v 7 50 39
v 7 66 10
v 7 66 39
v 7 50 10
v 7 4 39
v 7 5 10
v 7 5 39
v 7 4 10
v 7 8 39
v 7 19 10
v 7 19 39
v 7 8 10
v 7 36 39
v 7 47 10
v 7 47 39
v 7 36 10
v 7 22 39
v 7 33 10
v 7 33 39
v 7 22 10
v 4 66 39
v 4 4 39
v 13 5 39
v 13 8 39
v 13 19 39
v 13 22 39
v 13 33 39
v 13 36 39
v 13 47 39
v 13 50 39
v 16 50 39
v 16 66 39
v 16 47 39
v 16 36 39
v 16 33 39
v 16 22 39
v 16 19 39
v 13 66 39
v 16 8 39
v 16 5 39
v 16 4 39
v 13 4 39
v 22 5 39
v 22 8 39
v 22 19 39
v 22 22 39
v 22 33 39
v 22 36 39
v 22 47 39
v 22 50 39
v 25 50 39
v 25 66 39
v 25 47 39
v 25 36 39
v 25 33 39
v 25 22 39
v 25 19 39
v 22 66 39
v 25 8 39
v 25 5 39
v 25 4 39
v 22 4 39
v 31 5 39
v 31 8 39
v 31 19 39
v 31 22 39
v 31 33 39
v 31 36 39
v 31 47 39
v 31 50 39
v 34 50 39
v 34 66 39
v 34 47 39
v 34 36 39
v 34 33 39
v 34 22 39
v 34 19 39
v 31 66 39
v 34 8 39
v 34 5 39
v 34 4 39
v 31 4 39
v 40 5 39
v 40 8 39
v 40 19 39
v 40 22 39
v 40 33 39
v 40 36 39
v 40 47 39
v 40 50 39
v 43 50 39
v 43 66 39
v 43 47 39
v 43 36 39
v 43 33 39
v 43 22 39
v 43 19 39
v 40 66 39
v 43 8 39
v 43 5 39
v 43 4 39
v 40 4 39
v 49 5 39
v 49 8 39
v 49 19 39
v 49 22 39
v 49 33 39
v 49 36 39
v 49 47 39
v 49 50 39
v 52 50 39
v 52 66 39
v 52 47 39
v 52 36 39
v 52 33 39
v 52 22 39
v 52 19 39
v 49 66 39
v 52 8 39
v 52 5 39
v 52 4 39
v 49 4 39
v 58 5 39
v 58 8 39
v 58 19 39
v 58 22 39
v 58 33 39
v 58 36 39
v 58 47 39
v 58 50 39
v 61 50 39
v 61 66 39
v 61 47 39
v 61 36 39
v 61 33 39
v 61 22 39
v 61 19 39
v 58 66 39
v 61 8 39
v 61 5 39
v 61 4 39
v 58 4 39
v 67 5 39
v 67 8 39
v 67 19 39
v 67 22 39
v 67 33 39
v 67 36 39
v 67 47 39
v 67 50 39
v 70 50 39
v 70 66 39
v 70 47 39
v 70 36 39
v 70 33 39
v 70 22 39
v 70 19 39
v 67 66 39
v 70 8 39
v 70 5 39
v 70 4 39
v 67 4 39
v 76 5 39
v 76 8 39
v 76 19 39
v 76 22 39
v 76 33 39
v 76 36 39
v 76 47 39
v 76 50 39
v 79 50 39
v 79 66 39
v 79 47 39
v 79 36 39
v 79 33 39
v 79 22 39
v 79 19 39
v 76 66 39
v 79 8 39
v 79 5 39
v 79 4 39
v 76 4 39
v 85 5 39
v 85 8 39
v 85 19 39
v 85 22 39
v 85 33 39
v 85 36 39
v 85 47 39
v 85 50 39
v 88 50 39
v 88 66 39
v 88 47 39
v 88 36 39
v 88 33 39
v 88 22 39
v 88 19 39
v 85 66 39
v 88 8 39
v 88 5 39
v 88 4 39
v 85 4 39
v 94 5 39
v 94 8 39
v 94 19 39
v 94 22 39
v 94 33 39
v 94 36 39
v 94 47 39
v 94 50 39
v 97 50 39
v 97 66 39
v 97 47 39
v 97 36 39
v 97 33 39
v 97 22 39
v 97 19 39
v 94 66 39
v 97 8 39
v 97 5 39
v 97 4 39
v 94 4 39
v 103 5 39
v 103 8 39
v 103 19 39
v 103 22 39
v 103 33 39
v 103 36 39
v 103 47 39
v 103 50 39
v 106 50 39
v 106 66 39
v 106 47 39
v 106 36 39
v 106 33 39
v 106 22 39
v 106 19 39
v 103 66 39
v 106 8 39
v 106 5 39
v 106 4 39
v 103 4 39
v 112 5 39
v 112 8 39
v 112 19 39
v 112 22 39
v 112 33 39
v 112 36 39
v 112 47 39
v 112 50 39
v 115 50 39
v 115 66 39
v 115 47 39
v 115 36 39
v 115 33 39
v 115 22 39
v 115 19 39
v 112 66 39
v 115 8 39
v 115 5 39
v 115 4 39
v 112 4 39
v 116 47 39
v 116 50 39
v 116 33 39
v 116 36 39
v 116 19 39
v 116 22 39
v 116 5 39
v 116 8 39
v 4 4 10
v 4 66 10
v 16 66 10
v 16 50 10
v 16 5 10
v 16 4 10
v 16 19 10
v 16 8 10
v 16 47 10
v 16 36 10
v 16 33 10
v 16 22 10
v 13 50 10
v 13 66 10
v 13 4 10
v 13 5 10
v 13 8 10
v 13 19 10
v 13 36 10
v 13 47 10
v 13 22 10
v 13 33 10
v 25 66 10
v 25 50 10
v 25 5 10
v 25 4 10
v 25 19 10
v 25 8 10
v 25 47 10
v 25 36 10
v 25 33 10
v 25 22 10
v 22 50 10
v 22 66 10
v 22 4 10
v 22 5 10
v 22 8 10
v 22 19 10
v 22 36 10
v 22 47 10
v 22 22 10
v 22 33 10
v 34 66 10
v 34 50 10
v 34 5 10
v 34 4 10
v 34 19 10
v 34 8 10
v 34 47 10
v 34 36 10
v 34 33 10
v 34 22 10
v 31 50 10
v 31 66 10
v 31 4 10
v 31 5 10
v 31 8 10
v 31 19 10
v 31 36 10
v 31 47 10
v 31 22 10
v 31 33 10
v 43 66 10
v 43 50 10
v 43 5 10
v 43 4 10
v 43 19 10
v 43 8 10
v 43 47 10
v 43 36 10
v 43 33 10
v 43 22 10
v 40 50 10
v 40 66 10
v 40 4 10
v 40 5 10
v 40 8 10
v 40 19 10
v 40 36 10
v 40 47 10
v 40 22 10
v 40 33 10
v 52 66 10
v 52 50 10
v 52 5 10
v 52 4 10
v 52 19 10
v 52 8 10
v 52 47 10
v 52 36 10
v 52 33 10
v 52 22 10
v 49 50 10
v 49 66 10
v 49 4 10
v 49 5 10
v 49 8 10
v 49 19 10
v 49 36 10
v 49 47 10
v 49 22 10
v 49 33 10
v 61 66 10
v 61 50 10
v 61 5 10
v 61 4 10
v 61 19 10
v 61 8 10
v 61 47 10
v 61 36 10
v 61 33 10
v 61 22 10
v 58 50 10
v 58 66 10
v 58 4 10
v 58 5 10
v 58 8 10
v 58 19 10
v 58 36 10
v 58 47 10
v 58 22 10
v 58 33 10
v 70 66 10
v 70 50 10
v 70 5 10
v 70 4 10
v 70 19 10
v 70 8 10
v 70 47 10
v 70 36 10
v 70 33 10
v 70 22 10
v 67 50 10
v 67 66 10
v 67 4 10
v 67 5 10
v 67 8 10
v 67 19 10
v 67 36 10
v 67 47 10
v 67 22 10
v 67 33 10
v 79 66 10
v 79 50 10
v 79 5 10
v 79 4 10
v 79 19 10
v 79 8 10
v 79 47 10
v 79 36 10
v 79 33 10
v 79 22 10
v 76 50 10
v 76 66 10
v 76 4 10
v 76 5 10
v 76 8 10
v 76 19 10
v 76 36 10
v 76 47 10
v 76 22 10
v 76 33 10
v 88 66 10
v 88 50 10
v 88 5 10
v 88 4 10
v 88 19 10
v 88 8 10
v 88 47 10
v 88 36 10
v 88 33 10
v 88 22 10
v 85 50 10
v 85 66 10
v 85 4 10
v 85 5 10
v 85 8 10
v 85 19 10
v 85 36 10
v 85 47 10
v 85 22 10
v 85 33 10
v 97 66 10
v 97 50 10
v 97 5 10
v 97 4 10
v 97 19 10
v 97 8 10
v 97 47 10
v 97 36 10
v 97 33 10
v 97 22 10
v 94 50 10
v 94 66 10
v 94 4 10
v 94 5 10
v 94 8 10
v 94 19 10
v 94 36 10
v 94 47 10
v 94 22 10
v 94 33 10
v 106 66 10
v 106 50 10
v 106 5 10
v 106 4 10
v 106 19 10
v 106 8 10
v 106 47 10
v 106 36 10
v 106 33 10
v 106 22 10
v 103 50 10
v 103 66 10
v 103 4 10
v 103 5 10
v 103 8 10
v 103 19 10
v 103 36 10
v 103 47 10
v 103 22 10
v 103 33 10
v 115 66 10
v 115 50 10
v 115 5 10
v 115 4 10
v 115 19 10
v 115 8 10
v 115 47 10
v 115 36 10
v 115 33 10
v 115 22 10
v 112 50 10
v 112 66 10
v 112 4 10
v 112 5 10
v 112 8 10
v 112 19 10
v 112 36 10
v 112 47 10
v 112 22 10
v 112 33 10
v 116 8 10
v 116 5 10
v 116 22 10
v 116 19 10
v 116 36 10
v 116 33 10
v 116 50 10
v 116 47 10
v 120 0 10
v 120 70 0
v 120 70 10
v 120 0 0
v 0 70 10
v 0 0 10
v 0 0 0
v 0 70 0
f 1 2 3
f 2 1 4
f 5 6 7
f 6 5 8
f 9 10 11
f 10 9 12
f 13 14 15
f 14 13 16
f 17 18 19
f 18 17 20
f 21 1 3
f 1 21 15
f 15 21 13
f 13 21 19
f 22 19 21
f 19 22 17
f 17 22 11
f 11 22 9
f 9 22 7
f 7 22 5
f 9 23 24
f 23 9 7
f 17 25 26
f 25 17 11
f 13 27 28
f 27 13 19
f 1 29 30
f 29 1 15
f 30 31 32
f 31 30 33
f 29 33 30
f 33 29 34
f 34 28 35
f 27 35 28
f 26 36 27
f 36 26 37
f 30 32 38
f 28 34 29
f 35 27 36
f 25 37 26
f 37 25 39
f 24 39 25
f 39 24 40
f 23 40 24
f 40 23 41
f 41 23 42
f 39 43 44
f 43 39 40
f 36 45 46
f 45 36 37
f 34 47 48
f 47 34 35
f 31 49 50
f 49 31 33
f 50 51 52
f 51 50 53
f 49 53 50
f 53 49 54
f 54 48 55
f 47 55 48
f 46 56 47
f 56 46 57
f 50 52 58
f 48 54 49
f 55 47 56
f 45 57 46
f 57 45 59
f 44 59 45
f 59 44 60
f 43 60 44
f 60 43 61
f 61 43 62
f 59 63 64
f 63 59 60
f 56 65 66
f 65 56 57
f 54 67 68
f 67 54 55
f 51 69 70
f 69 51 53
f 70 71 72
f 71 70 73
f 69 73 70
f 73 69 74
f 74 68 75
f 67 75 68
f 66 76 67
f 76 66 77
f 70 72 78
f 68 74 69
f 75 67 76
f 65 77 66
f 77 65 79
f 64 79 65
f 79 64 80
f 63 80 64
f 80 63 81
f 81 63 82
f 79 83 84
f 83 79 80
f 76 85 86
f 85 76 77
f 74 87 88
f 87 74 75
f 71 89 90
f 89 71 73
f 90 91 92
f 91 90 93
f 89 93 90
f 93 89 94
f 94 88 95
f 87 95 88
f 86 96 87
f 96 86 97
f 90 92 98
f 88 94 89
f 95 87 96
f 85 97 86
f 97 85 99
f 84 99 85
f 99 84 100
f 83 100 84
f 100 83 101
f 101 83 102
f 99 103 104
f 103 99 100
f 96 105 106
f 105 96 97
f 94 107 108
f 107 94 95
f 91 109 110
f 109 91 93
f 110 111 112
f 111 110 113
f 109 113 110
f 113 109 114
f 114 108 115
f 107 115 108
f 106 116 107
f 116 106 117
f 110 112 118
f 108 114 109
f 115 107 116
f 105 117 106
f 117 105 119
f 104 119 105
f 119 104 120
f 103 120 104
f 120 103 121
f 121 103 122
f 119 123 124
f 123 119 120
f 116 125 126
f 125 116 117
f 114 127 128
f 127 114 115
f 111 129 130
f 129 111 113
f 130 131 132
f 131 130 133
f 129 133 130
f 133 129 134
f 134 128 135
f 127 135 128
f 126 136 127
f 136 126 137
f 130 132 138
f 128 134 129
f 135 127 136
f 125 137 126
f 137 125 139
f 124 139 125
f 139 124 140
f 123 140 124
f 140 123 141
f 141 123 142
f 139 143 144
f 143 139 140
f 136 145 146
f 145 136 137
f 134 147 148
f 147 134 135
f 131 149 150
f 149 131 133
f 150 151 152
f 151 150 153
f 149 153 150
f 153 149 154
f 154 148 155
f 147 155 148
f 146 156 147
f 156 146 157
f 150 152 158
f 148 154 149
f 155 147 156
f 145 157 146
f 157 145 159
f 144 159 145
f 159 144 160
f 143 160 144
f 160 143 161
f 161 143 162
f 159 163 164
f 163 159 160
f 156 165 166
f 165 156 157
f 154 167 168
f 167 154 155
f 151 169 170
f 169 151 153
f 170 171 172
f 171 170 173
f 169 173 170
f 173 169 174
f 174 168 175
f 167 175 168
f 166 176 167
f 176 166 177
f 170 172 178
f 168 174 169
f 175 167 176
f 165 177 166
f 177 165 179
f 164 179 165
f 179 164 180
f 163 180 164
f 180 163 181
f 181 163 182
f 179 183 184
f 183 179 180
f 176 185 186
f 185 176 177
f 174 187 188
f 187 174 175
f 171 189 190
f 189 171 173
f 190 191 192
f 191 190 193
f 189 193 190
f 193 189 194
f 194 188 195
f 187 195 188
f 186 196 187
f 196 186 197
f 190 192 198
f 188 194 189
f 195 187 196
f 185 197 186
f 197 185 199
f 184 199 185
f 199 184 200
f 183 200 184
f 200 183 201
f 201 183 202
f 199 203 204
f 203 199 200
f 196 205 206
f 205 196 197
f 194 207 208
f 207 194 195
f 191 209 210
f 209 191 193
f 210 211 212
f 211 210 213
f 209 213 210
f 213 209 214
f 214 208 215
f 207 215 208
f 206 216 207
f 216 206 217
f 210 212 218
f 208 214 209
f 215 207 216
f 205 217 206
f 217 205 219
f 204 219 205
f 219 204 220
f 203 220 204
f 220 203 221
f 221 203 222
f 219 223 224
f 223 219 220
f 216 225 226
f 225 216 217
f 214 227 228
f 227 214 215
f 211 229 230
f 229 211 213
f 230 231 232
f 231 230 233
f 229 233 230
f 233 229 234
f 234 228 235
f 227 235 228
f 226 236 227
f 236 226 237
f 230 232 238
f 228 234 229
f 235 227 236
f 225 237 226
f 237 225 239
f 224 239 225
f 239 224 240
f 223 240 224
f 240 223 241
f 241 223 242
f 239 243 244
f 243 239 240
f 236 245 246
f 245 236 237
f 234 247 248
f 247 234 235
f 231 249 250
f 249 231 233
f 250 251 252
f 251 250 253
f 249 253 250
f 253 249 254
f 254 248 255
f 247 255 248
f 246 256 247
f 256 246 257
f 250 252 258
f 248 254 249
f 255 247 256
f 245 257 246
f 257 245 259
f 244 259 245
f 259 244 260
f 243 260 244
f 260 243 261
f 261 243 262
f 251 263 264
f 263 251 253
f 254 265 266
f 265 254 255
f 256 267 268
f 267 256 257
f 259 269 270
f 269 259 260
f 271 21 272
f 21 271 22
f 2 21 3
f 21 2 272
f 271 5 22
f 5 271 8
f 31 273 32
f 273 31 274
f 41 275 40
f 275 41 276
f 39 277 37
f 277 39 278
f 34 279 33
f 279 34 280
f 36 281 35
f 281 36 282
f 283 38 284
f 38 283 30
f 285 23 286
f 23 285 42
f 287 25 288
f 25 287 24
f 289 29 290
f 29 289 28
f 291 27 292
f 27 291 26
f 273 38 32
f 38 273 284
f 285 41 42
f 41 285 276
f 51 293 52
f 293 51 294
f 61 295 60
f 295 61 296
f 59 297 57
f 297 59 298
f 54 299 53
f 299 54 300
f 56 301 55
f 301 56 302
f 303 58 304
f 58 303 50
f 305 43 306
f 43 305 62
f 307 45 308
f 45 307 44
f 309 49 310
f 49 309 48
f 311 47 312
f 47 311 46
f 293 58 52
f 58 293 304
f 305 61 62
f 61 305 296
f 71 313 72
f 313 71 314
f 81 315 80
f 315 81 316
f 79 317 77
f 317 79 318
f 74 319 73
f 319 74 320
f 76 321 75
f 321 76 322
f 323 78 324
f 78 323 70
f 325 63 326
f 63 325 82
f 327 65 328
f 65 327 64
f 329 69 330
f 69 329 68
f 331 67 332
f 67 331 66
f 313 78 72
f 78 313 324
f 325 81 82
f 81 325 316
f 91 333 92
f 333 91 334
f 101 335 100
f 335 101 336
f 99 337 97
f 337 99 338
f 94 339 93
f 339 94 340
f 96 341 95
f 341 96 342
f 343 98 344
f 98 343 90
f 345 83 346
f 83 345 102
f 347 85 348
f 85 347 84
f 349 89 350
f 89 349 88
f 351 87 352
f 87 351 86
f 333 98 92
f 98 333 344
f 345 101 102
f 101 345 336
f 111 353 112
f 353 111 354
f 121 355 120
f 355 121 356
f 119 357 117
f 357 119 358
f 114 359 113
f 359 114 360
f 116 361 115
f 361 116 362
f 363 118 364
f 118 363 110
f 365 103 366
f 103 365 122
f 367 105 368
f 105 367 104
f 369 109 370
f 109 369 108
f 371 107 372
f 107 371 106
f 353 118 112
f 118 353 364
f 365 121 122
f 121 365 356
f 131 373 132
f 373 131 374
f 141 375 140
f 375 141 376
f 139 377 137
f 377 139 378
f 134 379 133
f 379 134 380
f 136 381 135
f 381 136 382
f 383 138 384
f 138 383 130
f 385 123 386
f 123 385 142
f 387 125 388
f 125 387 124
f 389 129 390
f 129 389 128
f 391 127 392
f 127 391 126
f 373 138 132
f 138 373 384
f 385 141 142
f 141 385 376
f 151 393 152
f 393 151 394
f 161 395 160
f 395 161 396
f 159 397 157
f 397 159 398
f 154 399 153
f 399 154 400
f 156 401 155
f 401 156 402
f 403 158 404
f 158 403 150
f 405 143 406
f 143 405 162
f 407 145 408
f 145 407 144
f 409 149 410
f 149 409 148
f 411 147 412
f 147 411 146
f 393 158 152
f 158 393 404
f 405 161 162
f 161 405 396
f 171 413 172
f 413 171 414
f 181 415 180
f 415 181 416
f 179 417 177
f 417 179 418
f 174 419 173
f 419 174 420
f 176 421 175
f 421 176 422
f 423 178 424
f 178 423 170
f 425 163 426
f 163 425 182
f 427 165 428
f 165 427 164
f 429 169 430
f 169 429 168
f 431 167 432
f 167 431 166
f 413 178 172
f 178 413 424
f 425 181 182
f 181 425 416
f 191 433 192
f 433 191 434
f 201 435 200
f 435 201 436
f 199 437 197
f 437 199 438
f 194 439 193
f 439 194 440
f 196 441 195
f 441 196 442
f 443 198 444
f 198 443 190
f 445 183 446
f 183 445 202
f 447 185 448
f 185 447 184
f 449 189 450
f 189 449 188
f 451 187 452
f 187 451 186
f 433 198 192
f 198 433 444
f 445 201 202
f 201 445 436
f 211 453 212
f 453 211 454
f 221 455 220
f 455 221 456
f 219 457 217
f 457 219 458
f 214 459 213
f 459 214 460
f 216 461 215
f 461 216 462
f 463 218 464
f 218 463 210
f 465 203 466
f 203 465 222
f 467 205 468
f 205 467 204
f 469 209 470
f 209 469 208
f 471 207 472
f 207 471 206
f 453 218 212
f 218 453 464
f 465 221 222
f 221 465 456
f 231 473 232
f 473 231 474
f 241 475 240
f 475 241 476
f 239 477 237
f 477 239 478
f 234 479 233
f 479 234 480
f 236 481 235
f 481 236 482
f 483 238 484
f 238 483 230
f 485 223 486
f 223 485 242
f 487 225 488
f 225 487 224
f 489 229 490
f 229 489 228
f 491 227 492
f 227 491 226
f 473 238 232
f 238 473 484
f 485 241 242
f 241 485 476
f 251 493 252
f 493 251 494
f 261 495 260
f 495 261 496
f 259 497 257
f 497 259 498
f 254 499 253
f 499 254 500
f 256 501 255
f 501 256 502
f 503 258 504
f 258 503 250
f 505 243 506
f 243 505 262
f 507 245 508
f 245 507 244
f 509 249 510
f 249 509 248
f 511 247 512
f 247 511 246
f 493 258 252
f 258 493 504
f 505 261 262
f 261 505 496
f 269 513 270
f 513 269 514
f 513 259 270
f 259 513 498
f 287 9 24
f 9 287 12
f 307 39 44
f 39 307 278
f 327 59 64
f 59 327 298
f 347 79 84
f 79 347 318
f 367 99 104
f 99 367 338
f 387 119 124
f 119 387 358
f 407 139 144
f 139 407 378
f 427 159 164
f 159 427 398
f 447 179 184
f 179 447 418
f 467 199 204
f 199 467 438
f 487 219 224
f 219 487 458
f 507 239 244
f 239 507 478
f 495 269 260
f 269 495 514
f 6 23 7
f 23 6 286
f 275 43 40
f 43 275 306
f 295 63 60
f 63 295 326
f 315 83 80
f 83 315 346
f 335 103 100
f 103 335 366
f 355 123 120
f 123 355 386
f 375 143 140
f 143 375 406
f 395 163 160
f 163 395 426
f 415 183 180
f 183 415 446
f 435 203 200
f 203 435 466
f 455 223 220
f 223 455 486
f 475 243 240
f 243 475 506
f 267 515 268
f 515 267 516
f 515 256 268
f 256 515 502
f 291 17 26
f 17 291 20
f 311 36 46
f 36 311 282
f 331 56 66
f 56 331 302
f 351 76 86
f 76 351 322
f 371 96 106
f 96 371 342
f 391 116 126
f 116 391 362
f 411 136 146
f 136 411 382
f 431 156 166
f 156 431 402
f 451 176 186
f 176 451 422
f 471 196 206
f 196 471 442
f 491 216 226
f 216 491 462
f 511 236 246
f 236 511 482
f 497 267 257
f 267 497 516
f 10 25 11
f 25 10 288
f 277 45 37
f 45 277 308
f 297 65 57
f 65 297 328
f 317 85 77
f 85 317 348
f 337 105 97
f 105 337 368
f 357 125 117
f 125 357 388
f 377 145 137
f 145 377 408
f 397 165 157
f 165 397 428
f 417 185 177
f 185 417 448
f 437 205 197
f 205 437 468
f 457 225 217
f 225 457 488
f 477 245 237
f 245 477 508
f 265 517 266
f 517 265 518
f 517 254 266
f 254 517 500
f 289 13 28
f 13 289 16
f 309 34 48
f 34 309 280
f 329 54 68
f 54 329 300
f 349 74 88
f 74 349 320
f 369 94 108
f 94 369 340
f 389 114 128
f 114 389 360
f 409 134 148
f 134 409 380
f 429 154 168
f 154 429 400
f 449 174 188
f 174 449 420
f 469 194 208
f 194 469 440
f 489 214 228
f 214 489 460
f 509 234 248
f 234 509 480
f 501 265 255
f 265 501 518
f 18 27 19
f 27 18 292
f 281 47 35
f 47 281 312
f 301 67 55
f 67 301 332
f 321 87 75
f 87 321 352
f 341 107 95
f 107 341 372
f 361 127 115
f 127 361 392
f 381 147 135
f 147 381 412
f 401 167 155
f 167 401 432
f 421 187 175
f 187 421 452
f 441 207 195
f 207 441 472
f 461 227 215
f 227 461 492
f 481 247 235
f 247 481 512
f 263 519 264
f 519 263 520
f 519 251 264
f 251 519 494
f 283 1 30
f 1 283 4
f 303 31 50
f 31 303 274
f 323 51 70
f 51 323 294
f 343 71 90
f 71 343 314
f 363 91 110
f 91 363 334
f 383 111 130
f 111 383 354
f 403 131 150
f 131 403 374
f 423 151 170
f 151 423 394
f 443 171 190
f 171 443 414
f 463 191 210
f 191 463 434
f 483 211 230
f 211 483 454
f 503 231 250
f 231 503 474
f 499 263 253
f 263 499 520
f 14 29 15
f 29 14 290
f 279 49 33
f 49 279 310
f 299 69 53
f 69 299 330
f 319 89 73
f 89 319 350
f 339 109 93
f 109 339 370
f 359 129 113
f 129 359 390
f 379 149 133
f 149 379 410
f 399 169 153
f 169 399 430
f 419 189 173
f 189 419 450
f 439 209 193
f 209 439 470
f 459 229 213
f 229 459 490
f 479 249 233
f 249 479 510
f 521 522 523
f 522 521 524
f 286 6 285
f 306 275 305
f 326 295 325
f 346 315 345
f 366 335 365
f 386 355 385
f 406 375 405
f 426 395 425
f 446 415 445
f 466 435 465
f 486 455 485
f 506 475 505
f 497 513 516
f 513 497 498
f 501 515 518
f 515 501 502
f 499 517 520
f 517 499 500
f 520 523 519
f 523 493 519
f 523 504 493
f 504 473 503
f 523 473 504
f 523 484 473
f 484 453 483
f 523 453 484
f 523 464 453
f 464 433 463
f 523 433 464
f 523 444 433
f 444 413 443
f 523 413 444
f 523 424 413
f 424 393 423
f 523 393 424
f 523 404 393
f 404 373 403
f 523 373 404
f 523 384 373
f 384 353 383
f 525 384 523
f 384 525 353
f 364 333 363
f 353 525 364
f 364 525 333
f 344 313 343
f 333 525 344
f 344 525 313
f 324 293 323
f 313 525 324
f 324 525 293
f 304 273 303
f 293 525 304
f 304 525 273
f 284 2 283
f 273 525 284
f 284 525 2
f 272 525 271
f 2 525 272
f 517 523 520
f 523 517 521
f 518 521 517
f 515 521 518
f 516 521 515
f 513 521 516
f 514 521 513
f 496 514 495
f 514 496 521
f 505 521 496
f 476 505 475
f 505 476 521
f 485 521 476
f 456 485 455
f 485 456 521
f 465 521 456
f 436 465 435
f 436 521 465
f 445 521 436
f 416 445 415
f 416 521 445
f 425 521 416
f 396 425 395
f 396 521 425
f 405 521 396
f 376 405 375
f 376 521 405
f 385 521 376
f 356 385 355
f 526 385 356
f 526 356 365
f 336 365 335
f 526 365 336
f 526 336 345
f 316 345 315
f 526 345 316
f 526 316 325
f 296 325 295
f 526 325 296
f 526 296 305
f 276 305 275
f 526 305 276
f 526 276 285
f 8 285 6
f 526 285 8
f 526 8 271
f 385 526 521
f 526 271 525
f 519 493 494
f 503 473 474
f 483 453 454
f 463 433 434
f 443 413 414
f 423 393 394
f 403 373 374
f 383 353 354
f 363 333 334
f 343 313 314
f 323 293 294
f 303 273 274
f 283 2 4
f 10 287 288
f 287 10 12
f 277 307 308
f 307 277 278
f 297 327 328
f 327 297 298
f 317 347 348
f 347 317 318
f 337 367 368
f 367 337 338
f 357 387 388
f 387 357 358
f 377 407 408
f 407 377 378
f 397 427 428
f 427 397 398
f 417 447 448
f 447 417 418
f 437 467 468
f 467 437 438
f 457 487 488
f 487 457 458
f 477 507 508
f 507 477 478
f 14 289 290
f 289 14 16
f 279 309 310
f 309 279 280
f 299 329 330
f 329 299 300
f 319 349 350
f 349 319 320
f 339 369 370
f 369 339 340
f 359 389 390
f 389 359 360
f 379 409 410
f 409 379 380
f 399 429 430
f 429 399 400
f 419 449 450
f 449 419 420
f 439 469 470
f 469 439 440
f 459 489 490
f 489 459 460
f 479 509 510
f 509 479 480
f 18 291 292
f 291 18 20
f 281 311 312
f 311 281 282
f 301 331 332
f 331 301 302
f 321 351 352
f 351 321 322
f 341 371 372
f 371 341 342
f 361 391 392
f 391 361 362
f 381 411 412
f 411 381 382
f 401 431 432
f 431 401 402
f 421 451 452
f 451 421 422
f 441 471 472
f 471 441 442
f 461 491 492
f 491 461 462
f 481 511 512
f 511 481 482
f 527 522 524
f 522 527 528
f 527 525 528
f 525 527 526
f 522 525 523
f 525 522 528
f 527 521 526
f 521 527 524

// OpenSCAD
$fn = 32;

// ----------------------------------------------------------------------
// Heatsink: cross fin block
// ----------------------------------------------------------------------

// --- parameters (mm) ---
base_l = 120;             // base length, X
base_w = 70;              // base width, Y
base_t = 10;              // base plate thickness
fin_h = 30;               // fin height above the base
fin_t = 3;                // fin thickness
edge = 4;                 // margin from the base ends
pitch = 9;                // fin pitch
rib_pitch = 14;           // cross rib pitch

n_fins = floor((base_l - 2 * edge - fin_t) / pitch) + 1;  // fin count
total_h = base_t + fin_h - 1;  // overall height
n_ribs = floor((base_w - 2 * edge) / rib_pitch);  // rib count

union() {
  cube([base_l, base_w, base_t]);
  for (i = [0 : n_fins - 1])
    translate([edge + i * pitch, edge, base_t - 1])
      cube([fin_t, base_w - 2 * edge, fin_h]);
  for (i = [0 : n_ribs - 1])
    translate([edge, edge + 1 + i * rib_pitch, base_t - 1])
      cube([base_l - 2 * edge, fin_t, fin_h]);
}
